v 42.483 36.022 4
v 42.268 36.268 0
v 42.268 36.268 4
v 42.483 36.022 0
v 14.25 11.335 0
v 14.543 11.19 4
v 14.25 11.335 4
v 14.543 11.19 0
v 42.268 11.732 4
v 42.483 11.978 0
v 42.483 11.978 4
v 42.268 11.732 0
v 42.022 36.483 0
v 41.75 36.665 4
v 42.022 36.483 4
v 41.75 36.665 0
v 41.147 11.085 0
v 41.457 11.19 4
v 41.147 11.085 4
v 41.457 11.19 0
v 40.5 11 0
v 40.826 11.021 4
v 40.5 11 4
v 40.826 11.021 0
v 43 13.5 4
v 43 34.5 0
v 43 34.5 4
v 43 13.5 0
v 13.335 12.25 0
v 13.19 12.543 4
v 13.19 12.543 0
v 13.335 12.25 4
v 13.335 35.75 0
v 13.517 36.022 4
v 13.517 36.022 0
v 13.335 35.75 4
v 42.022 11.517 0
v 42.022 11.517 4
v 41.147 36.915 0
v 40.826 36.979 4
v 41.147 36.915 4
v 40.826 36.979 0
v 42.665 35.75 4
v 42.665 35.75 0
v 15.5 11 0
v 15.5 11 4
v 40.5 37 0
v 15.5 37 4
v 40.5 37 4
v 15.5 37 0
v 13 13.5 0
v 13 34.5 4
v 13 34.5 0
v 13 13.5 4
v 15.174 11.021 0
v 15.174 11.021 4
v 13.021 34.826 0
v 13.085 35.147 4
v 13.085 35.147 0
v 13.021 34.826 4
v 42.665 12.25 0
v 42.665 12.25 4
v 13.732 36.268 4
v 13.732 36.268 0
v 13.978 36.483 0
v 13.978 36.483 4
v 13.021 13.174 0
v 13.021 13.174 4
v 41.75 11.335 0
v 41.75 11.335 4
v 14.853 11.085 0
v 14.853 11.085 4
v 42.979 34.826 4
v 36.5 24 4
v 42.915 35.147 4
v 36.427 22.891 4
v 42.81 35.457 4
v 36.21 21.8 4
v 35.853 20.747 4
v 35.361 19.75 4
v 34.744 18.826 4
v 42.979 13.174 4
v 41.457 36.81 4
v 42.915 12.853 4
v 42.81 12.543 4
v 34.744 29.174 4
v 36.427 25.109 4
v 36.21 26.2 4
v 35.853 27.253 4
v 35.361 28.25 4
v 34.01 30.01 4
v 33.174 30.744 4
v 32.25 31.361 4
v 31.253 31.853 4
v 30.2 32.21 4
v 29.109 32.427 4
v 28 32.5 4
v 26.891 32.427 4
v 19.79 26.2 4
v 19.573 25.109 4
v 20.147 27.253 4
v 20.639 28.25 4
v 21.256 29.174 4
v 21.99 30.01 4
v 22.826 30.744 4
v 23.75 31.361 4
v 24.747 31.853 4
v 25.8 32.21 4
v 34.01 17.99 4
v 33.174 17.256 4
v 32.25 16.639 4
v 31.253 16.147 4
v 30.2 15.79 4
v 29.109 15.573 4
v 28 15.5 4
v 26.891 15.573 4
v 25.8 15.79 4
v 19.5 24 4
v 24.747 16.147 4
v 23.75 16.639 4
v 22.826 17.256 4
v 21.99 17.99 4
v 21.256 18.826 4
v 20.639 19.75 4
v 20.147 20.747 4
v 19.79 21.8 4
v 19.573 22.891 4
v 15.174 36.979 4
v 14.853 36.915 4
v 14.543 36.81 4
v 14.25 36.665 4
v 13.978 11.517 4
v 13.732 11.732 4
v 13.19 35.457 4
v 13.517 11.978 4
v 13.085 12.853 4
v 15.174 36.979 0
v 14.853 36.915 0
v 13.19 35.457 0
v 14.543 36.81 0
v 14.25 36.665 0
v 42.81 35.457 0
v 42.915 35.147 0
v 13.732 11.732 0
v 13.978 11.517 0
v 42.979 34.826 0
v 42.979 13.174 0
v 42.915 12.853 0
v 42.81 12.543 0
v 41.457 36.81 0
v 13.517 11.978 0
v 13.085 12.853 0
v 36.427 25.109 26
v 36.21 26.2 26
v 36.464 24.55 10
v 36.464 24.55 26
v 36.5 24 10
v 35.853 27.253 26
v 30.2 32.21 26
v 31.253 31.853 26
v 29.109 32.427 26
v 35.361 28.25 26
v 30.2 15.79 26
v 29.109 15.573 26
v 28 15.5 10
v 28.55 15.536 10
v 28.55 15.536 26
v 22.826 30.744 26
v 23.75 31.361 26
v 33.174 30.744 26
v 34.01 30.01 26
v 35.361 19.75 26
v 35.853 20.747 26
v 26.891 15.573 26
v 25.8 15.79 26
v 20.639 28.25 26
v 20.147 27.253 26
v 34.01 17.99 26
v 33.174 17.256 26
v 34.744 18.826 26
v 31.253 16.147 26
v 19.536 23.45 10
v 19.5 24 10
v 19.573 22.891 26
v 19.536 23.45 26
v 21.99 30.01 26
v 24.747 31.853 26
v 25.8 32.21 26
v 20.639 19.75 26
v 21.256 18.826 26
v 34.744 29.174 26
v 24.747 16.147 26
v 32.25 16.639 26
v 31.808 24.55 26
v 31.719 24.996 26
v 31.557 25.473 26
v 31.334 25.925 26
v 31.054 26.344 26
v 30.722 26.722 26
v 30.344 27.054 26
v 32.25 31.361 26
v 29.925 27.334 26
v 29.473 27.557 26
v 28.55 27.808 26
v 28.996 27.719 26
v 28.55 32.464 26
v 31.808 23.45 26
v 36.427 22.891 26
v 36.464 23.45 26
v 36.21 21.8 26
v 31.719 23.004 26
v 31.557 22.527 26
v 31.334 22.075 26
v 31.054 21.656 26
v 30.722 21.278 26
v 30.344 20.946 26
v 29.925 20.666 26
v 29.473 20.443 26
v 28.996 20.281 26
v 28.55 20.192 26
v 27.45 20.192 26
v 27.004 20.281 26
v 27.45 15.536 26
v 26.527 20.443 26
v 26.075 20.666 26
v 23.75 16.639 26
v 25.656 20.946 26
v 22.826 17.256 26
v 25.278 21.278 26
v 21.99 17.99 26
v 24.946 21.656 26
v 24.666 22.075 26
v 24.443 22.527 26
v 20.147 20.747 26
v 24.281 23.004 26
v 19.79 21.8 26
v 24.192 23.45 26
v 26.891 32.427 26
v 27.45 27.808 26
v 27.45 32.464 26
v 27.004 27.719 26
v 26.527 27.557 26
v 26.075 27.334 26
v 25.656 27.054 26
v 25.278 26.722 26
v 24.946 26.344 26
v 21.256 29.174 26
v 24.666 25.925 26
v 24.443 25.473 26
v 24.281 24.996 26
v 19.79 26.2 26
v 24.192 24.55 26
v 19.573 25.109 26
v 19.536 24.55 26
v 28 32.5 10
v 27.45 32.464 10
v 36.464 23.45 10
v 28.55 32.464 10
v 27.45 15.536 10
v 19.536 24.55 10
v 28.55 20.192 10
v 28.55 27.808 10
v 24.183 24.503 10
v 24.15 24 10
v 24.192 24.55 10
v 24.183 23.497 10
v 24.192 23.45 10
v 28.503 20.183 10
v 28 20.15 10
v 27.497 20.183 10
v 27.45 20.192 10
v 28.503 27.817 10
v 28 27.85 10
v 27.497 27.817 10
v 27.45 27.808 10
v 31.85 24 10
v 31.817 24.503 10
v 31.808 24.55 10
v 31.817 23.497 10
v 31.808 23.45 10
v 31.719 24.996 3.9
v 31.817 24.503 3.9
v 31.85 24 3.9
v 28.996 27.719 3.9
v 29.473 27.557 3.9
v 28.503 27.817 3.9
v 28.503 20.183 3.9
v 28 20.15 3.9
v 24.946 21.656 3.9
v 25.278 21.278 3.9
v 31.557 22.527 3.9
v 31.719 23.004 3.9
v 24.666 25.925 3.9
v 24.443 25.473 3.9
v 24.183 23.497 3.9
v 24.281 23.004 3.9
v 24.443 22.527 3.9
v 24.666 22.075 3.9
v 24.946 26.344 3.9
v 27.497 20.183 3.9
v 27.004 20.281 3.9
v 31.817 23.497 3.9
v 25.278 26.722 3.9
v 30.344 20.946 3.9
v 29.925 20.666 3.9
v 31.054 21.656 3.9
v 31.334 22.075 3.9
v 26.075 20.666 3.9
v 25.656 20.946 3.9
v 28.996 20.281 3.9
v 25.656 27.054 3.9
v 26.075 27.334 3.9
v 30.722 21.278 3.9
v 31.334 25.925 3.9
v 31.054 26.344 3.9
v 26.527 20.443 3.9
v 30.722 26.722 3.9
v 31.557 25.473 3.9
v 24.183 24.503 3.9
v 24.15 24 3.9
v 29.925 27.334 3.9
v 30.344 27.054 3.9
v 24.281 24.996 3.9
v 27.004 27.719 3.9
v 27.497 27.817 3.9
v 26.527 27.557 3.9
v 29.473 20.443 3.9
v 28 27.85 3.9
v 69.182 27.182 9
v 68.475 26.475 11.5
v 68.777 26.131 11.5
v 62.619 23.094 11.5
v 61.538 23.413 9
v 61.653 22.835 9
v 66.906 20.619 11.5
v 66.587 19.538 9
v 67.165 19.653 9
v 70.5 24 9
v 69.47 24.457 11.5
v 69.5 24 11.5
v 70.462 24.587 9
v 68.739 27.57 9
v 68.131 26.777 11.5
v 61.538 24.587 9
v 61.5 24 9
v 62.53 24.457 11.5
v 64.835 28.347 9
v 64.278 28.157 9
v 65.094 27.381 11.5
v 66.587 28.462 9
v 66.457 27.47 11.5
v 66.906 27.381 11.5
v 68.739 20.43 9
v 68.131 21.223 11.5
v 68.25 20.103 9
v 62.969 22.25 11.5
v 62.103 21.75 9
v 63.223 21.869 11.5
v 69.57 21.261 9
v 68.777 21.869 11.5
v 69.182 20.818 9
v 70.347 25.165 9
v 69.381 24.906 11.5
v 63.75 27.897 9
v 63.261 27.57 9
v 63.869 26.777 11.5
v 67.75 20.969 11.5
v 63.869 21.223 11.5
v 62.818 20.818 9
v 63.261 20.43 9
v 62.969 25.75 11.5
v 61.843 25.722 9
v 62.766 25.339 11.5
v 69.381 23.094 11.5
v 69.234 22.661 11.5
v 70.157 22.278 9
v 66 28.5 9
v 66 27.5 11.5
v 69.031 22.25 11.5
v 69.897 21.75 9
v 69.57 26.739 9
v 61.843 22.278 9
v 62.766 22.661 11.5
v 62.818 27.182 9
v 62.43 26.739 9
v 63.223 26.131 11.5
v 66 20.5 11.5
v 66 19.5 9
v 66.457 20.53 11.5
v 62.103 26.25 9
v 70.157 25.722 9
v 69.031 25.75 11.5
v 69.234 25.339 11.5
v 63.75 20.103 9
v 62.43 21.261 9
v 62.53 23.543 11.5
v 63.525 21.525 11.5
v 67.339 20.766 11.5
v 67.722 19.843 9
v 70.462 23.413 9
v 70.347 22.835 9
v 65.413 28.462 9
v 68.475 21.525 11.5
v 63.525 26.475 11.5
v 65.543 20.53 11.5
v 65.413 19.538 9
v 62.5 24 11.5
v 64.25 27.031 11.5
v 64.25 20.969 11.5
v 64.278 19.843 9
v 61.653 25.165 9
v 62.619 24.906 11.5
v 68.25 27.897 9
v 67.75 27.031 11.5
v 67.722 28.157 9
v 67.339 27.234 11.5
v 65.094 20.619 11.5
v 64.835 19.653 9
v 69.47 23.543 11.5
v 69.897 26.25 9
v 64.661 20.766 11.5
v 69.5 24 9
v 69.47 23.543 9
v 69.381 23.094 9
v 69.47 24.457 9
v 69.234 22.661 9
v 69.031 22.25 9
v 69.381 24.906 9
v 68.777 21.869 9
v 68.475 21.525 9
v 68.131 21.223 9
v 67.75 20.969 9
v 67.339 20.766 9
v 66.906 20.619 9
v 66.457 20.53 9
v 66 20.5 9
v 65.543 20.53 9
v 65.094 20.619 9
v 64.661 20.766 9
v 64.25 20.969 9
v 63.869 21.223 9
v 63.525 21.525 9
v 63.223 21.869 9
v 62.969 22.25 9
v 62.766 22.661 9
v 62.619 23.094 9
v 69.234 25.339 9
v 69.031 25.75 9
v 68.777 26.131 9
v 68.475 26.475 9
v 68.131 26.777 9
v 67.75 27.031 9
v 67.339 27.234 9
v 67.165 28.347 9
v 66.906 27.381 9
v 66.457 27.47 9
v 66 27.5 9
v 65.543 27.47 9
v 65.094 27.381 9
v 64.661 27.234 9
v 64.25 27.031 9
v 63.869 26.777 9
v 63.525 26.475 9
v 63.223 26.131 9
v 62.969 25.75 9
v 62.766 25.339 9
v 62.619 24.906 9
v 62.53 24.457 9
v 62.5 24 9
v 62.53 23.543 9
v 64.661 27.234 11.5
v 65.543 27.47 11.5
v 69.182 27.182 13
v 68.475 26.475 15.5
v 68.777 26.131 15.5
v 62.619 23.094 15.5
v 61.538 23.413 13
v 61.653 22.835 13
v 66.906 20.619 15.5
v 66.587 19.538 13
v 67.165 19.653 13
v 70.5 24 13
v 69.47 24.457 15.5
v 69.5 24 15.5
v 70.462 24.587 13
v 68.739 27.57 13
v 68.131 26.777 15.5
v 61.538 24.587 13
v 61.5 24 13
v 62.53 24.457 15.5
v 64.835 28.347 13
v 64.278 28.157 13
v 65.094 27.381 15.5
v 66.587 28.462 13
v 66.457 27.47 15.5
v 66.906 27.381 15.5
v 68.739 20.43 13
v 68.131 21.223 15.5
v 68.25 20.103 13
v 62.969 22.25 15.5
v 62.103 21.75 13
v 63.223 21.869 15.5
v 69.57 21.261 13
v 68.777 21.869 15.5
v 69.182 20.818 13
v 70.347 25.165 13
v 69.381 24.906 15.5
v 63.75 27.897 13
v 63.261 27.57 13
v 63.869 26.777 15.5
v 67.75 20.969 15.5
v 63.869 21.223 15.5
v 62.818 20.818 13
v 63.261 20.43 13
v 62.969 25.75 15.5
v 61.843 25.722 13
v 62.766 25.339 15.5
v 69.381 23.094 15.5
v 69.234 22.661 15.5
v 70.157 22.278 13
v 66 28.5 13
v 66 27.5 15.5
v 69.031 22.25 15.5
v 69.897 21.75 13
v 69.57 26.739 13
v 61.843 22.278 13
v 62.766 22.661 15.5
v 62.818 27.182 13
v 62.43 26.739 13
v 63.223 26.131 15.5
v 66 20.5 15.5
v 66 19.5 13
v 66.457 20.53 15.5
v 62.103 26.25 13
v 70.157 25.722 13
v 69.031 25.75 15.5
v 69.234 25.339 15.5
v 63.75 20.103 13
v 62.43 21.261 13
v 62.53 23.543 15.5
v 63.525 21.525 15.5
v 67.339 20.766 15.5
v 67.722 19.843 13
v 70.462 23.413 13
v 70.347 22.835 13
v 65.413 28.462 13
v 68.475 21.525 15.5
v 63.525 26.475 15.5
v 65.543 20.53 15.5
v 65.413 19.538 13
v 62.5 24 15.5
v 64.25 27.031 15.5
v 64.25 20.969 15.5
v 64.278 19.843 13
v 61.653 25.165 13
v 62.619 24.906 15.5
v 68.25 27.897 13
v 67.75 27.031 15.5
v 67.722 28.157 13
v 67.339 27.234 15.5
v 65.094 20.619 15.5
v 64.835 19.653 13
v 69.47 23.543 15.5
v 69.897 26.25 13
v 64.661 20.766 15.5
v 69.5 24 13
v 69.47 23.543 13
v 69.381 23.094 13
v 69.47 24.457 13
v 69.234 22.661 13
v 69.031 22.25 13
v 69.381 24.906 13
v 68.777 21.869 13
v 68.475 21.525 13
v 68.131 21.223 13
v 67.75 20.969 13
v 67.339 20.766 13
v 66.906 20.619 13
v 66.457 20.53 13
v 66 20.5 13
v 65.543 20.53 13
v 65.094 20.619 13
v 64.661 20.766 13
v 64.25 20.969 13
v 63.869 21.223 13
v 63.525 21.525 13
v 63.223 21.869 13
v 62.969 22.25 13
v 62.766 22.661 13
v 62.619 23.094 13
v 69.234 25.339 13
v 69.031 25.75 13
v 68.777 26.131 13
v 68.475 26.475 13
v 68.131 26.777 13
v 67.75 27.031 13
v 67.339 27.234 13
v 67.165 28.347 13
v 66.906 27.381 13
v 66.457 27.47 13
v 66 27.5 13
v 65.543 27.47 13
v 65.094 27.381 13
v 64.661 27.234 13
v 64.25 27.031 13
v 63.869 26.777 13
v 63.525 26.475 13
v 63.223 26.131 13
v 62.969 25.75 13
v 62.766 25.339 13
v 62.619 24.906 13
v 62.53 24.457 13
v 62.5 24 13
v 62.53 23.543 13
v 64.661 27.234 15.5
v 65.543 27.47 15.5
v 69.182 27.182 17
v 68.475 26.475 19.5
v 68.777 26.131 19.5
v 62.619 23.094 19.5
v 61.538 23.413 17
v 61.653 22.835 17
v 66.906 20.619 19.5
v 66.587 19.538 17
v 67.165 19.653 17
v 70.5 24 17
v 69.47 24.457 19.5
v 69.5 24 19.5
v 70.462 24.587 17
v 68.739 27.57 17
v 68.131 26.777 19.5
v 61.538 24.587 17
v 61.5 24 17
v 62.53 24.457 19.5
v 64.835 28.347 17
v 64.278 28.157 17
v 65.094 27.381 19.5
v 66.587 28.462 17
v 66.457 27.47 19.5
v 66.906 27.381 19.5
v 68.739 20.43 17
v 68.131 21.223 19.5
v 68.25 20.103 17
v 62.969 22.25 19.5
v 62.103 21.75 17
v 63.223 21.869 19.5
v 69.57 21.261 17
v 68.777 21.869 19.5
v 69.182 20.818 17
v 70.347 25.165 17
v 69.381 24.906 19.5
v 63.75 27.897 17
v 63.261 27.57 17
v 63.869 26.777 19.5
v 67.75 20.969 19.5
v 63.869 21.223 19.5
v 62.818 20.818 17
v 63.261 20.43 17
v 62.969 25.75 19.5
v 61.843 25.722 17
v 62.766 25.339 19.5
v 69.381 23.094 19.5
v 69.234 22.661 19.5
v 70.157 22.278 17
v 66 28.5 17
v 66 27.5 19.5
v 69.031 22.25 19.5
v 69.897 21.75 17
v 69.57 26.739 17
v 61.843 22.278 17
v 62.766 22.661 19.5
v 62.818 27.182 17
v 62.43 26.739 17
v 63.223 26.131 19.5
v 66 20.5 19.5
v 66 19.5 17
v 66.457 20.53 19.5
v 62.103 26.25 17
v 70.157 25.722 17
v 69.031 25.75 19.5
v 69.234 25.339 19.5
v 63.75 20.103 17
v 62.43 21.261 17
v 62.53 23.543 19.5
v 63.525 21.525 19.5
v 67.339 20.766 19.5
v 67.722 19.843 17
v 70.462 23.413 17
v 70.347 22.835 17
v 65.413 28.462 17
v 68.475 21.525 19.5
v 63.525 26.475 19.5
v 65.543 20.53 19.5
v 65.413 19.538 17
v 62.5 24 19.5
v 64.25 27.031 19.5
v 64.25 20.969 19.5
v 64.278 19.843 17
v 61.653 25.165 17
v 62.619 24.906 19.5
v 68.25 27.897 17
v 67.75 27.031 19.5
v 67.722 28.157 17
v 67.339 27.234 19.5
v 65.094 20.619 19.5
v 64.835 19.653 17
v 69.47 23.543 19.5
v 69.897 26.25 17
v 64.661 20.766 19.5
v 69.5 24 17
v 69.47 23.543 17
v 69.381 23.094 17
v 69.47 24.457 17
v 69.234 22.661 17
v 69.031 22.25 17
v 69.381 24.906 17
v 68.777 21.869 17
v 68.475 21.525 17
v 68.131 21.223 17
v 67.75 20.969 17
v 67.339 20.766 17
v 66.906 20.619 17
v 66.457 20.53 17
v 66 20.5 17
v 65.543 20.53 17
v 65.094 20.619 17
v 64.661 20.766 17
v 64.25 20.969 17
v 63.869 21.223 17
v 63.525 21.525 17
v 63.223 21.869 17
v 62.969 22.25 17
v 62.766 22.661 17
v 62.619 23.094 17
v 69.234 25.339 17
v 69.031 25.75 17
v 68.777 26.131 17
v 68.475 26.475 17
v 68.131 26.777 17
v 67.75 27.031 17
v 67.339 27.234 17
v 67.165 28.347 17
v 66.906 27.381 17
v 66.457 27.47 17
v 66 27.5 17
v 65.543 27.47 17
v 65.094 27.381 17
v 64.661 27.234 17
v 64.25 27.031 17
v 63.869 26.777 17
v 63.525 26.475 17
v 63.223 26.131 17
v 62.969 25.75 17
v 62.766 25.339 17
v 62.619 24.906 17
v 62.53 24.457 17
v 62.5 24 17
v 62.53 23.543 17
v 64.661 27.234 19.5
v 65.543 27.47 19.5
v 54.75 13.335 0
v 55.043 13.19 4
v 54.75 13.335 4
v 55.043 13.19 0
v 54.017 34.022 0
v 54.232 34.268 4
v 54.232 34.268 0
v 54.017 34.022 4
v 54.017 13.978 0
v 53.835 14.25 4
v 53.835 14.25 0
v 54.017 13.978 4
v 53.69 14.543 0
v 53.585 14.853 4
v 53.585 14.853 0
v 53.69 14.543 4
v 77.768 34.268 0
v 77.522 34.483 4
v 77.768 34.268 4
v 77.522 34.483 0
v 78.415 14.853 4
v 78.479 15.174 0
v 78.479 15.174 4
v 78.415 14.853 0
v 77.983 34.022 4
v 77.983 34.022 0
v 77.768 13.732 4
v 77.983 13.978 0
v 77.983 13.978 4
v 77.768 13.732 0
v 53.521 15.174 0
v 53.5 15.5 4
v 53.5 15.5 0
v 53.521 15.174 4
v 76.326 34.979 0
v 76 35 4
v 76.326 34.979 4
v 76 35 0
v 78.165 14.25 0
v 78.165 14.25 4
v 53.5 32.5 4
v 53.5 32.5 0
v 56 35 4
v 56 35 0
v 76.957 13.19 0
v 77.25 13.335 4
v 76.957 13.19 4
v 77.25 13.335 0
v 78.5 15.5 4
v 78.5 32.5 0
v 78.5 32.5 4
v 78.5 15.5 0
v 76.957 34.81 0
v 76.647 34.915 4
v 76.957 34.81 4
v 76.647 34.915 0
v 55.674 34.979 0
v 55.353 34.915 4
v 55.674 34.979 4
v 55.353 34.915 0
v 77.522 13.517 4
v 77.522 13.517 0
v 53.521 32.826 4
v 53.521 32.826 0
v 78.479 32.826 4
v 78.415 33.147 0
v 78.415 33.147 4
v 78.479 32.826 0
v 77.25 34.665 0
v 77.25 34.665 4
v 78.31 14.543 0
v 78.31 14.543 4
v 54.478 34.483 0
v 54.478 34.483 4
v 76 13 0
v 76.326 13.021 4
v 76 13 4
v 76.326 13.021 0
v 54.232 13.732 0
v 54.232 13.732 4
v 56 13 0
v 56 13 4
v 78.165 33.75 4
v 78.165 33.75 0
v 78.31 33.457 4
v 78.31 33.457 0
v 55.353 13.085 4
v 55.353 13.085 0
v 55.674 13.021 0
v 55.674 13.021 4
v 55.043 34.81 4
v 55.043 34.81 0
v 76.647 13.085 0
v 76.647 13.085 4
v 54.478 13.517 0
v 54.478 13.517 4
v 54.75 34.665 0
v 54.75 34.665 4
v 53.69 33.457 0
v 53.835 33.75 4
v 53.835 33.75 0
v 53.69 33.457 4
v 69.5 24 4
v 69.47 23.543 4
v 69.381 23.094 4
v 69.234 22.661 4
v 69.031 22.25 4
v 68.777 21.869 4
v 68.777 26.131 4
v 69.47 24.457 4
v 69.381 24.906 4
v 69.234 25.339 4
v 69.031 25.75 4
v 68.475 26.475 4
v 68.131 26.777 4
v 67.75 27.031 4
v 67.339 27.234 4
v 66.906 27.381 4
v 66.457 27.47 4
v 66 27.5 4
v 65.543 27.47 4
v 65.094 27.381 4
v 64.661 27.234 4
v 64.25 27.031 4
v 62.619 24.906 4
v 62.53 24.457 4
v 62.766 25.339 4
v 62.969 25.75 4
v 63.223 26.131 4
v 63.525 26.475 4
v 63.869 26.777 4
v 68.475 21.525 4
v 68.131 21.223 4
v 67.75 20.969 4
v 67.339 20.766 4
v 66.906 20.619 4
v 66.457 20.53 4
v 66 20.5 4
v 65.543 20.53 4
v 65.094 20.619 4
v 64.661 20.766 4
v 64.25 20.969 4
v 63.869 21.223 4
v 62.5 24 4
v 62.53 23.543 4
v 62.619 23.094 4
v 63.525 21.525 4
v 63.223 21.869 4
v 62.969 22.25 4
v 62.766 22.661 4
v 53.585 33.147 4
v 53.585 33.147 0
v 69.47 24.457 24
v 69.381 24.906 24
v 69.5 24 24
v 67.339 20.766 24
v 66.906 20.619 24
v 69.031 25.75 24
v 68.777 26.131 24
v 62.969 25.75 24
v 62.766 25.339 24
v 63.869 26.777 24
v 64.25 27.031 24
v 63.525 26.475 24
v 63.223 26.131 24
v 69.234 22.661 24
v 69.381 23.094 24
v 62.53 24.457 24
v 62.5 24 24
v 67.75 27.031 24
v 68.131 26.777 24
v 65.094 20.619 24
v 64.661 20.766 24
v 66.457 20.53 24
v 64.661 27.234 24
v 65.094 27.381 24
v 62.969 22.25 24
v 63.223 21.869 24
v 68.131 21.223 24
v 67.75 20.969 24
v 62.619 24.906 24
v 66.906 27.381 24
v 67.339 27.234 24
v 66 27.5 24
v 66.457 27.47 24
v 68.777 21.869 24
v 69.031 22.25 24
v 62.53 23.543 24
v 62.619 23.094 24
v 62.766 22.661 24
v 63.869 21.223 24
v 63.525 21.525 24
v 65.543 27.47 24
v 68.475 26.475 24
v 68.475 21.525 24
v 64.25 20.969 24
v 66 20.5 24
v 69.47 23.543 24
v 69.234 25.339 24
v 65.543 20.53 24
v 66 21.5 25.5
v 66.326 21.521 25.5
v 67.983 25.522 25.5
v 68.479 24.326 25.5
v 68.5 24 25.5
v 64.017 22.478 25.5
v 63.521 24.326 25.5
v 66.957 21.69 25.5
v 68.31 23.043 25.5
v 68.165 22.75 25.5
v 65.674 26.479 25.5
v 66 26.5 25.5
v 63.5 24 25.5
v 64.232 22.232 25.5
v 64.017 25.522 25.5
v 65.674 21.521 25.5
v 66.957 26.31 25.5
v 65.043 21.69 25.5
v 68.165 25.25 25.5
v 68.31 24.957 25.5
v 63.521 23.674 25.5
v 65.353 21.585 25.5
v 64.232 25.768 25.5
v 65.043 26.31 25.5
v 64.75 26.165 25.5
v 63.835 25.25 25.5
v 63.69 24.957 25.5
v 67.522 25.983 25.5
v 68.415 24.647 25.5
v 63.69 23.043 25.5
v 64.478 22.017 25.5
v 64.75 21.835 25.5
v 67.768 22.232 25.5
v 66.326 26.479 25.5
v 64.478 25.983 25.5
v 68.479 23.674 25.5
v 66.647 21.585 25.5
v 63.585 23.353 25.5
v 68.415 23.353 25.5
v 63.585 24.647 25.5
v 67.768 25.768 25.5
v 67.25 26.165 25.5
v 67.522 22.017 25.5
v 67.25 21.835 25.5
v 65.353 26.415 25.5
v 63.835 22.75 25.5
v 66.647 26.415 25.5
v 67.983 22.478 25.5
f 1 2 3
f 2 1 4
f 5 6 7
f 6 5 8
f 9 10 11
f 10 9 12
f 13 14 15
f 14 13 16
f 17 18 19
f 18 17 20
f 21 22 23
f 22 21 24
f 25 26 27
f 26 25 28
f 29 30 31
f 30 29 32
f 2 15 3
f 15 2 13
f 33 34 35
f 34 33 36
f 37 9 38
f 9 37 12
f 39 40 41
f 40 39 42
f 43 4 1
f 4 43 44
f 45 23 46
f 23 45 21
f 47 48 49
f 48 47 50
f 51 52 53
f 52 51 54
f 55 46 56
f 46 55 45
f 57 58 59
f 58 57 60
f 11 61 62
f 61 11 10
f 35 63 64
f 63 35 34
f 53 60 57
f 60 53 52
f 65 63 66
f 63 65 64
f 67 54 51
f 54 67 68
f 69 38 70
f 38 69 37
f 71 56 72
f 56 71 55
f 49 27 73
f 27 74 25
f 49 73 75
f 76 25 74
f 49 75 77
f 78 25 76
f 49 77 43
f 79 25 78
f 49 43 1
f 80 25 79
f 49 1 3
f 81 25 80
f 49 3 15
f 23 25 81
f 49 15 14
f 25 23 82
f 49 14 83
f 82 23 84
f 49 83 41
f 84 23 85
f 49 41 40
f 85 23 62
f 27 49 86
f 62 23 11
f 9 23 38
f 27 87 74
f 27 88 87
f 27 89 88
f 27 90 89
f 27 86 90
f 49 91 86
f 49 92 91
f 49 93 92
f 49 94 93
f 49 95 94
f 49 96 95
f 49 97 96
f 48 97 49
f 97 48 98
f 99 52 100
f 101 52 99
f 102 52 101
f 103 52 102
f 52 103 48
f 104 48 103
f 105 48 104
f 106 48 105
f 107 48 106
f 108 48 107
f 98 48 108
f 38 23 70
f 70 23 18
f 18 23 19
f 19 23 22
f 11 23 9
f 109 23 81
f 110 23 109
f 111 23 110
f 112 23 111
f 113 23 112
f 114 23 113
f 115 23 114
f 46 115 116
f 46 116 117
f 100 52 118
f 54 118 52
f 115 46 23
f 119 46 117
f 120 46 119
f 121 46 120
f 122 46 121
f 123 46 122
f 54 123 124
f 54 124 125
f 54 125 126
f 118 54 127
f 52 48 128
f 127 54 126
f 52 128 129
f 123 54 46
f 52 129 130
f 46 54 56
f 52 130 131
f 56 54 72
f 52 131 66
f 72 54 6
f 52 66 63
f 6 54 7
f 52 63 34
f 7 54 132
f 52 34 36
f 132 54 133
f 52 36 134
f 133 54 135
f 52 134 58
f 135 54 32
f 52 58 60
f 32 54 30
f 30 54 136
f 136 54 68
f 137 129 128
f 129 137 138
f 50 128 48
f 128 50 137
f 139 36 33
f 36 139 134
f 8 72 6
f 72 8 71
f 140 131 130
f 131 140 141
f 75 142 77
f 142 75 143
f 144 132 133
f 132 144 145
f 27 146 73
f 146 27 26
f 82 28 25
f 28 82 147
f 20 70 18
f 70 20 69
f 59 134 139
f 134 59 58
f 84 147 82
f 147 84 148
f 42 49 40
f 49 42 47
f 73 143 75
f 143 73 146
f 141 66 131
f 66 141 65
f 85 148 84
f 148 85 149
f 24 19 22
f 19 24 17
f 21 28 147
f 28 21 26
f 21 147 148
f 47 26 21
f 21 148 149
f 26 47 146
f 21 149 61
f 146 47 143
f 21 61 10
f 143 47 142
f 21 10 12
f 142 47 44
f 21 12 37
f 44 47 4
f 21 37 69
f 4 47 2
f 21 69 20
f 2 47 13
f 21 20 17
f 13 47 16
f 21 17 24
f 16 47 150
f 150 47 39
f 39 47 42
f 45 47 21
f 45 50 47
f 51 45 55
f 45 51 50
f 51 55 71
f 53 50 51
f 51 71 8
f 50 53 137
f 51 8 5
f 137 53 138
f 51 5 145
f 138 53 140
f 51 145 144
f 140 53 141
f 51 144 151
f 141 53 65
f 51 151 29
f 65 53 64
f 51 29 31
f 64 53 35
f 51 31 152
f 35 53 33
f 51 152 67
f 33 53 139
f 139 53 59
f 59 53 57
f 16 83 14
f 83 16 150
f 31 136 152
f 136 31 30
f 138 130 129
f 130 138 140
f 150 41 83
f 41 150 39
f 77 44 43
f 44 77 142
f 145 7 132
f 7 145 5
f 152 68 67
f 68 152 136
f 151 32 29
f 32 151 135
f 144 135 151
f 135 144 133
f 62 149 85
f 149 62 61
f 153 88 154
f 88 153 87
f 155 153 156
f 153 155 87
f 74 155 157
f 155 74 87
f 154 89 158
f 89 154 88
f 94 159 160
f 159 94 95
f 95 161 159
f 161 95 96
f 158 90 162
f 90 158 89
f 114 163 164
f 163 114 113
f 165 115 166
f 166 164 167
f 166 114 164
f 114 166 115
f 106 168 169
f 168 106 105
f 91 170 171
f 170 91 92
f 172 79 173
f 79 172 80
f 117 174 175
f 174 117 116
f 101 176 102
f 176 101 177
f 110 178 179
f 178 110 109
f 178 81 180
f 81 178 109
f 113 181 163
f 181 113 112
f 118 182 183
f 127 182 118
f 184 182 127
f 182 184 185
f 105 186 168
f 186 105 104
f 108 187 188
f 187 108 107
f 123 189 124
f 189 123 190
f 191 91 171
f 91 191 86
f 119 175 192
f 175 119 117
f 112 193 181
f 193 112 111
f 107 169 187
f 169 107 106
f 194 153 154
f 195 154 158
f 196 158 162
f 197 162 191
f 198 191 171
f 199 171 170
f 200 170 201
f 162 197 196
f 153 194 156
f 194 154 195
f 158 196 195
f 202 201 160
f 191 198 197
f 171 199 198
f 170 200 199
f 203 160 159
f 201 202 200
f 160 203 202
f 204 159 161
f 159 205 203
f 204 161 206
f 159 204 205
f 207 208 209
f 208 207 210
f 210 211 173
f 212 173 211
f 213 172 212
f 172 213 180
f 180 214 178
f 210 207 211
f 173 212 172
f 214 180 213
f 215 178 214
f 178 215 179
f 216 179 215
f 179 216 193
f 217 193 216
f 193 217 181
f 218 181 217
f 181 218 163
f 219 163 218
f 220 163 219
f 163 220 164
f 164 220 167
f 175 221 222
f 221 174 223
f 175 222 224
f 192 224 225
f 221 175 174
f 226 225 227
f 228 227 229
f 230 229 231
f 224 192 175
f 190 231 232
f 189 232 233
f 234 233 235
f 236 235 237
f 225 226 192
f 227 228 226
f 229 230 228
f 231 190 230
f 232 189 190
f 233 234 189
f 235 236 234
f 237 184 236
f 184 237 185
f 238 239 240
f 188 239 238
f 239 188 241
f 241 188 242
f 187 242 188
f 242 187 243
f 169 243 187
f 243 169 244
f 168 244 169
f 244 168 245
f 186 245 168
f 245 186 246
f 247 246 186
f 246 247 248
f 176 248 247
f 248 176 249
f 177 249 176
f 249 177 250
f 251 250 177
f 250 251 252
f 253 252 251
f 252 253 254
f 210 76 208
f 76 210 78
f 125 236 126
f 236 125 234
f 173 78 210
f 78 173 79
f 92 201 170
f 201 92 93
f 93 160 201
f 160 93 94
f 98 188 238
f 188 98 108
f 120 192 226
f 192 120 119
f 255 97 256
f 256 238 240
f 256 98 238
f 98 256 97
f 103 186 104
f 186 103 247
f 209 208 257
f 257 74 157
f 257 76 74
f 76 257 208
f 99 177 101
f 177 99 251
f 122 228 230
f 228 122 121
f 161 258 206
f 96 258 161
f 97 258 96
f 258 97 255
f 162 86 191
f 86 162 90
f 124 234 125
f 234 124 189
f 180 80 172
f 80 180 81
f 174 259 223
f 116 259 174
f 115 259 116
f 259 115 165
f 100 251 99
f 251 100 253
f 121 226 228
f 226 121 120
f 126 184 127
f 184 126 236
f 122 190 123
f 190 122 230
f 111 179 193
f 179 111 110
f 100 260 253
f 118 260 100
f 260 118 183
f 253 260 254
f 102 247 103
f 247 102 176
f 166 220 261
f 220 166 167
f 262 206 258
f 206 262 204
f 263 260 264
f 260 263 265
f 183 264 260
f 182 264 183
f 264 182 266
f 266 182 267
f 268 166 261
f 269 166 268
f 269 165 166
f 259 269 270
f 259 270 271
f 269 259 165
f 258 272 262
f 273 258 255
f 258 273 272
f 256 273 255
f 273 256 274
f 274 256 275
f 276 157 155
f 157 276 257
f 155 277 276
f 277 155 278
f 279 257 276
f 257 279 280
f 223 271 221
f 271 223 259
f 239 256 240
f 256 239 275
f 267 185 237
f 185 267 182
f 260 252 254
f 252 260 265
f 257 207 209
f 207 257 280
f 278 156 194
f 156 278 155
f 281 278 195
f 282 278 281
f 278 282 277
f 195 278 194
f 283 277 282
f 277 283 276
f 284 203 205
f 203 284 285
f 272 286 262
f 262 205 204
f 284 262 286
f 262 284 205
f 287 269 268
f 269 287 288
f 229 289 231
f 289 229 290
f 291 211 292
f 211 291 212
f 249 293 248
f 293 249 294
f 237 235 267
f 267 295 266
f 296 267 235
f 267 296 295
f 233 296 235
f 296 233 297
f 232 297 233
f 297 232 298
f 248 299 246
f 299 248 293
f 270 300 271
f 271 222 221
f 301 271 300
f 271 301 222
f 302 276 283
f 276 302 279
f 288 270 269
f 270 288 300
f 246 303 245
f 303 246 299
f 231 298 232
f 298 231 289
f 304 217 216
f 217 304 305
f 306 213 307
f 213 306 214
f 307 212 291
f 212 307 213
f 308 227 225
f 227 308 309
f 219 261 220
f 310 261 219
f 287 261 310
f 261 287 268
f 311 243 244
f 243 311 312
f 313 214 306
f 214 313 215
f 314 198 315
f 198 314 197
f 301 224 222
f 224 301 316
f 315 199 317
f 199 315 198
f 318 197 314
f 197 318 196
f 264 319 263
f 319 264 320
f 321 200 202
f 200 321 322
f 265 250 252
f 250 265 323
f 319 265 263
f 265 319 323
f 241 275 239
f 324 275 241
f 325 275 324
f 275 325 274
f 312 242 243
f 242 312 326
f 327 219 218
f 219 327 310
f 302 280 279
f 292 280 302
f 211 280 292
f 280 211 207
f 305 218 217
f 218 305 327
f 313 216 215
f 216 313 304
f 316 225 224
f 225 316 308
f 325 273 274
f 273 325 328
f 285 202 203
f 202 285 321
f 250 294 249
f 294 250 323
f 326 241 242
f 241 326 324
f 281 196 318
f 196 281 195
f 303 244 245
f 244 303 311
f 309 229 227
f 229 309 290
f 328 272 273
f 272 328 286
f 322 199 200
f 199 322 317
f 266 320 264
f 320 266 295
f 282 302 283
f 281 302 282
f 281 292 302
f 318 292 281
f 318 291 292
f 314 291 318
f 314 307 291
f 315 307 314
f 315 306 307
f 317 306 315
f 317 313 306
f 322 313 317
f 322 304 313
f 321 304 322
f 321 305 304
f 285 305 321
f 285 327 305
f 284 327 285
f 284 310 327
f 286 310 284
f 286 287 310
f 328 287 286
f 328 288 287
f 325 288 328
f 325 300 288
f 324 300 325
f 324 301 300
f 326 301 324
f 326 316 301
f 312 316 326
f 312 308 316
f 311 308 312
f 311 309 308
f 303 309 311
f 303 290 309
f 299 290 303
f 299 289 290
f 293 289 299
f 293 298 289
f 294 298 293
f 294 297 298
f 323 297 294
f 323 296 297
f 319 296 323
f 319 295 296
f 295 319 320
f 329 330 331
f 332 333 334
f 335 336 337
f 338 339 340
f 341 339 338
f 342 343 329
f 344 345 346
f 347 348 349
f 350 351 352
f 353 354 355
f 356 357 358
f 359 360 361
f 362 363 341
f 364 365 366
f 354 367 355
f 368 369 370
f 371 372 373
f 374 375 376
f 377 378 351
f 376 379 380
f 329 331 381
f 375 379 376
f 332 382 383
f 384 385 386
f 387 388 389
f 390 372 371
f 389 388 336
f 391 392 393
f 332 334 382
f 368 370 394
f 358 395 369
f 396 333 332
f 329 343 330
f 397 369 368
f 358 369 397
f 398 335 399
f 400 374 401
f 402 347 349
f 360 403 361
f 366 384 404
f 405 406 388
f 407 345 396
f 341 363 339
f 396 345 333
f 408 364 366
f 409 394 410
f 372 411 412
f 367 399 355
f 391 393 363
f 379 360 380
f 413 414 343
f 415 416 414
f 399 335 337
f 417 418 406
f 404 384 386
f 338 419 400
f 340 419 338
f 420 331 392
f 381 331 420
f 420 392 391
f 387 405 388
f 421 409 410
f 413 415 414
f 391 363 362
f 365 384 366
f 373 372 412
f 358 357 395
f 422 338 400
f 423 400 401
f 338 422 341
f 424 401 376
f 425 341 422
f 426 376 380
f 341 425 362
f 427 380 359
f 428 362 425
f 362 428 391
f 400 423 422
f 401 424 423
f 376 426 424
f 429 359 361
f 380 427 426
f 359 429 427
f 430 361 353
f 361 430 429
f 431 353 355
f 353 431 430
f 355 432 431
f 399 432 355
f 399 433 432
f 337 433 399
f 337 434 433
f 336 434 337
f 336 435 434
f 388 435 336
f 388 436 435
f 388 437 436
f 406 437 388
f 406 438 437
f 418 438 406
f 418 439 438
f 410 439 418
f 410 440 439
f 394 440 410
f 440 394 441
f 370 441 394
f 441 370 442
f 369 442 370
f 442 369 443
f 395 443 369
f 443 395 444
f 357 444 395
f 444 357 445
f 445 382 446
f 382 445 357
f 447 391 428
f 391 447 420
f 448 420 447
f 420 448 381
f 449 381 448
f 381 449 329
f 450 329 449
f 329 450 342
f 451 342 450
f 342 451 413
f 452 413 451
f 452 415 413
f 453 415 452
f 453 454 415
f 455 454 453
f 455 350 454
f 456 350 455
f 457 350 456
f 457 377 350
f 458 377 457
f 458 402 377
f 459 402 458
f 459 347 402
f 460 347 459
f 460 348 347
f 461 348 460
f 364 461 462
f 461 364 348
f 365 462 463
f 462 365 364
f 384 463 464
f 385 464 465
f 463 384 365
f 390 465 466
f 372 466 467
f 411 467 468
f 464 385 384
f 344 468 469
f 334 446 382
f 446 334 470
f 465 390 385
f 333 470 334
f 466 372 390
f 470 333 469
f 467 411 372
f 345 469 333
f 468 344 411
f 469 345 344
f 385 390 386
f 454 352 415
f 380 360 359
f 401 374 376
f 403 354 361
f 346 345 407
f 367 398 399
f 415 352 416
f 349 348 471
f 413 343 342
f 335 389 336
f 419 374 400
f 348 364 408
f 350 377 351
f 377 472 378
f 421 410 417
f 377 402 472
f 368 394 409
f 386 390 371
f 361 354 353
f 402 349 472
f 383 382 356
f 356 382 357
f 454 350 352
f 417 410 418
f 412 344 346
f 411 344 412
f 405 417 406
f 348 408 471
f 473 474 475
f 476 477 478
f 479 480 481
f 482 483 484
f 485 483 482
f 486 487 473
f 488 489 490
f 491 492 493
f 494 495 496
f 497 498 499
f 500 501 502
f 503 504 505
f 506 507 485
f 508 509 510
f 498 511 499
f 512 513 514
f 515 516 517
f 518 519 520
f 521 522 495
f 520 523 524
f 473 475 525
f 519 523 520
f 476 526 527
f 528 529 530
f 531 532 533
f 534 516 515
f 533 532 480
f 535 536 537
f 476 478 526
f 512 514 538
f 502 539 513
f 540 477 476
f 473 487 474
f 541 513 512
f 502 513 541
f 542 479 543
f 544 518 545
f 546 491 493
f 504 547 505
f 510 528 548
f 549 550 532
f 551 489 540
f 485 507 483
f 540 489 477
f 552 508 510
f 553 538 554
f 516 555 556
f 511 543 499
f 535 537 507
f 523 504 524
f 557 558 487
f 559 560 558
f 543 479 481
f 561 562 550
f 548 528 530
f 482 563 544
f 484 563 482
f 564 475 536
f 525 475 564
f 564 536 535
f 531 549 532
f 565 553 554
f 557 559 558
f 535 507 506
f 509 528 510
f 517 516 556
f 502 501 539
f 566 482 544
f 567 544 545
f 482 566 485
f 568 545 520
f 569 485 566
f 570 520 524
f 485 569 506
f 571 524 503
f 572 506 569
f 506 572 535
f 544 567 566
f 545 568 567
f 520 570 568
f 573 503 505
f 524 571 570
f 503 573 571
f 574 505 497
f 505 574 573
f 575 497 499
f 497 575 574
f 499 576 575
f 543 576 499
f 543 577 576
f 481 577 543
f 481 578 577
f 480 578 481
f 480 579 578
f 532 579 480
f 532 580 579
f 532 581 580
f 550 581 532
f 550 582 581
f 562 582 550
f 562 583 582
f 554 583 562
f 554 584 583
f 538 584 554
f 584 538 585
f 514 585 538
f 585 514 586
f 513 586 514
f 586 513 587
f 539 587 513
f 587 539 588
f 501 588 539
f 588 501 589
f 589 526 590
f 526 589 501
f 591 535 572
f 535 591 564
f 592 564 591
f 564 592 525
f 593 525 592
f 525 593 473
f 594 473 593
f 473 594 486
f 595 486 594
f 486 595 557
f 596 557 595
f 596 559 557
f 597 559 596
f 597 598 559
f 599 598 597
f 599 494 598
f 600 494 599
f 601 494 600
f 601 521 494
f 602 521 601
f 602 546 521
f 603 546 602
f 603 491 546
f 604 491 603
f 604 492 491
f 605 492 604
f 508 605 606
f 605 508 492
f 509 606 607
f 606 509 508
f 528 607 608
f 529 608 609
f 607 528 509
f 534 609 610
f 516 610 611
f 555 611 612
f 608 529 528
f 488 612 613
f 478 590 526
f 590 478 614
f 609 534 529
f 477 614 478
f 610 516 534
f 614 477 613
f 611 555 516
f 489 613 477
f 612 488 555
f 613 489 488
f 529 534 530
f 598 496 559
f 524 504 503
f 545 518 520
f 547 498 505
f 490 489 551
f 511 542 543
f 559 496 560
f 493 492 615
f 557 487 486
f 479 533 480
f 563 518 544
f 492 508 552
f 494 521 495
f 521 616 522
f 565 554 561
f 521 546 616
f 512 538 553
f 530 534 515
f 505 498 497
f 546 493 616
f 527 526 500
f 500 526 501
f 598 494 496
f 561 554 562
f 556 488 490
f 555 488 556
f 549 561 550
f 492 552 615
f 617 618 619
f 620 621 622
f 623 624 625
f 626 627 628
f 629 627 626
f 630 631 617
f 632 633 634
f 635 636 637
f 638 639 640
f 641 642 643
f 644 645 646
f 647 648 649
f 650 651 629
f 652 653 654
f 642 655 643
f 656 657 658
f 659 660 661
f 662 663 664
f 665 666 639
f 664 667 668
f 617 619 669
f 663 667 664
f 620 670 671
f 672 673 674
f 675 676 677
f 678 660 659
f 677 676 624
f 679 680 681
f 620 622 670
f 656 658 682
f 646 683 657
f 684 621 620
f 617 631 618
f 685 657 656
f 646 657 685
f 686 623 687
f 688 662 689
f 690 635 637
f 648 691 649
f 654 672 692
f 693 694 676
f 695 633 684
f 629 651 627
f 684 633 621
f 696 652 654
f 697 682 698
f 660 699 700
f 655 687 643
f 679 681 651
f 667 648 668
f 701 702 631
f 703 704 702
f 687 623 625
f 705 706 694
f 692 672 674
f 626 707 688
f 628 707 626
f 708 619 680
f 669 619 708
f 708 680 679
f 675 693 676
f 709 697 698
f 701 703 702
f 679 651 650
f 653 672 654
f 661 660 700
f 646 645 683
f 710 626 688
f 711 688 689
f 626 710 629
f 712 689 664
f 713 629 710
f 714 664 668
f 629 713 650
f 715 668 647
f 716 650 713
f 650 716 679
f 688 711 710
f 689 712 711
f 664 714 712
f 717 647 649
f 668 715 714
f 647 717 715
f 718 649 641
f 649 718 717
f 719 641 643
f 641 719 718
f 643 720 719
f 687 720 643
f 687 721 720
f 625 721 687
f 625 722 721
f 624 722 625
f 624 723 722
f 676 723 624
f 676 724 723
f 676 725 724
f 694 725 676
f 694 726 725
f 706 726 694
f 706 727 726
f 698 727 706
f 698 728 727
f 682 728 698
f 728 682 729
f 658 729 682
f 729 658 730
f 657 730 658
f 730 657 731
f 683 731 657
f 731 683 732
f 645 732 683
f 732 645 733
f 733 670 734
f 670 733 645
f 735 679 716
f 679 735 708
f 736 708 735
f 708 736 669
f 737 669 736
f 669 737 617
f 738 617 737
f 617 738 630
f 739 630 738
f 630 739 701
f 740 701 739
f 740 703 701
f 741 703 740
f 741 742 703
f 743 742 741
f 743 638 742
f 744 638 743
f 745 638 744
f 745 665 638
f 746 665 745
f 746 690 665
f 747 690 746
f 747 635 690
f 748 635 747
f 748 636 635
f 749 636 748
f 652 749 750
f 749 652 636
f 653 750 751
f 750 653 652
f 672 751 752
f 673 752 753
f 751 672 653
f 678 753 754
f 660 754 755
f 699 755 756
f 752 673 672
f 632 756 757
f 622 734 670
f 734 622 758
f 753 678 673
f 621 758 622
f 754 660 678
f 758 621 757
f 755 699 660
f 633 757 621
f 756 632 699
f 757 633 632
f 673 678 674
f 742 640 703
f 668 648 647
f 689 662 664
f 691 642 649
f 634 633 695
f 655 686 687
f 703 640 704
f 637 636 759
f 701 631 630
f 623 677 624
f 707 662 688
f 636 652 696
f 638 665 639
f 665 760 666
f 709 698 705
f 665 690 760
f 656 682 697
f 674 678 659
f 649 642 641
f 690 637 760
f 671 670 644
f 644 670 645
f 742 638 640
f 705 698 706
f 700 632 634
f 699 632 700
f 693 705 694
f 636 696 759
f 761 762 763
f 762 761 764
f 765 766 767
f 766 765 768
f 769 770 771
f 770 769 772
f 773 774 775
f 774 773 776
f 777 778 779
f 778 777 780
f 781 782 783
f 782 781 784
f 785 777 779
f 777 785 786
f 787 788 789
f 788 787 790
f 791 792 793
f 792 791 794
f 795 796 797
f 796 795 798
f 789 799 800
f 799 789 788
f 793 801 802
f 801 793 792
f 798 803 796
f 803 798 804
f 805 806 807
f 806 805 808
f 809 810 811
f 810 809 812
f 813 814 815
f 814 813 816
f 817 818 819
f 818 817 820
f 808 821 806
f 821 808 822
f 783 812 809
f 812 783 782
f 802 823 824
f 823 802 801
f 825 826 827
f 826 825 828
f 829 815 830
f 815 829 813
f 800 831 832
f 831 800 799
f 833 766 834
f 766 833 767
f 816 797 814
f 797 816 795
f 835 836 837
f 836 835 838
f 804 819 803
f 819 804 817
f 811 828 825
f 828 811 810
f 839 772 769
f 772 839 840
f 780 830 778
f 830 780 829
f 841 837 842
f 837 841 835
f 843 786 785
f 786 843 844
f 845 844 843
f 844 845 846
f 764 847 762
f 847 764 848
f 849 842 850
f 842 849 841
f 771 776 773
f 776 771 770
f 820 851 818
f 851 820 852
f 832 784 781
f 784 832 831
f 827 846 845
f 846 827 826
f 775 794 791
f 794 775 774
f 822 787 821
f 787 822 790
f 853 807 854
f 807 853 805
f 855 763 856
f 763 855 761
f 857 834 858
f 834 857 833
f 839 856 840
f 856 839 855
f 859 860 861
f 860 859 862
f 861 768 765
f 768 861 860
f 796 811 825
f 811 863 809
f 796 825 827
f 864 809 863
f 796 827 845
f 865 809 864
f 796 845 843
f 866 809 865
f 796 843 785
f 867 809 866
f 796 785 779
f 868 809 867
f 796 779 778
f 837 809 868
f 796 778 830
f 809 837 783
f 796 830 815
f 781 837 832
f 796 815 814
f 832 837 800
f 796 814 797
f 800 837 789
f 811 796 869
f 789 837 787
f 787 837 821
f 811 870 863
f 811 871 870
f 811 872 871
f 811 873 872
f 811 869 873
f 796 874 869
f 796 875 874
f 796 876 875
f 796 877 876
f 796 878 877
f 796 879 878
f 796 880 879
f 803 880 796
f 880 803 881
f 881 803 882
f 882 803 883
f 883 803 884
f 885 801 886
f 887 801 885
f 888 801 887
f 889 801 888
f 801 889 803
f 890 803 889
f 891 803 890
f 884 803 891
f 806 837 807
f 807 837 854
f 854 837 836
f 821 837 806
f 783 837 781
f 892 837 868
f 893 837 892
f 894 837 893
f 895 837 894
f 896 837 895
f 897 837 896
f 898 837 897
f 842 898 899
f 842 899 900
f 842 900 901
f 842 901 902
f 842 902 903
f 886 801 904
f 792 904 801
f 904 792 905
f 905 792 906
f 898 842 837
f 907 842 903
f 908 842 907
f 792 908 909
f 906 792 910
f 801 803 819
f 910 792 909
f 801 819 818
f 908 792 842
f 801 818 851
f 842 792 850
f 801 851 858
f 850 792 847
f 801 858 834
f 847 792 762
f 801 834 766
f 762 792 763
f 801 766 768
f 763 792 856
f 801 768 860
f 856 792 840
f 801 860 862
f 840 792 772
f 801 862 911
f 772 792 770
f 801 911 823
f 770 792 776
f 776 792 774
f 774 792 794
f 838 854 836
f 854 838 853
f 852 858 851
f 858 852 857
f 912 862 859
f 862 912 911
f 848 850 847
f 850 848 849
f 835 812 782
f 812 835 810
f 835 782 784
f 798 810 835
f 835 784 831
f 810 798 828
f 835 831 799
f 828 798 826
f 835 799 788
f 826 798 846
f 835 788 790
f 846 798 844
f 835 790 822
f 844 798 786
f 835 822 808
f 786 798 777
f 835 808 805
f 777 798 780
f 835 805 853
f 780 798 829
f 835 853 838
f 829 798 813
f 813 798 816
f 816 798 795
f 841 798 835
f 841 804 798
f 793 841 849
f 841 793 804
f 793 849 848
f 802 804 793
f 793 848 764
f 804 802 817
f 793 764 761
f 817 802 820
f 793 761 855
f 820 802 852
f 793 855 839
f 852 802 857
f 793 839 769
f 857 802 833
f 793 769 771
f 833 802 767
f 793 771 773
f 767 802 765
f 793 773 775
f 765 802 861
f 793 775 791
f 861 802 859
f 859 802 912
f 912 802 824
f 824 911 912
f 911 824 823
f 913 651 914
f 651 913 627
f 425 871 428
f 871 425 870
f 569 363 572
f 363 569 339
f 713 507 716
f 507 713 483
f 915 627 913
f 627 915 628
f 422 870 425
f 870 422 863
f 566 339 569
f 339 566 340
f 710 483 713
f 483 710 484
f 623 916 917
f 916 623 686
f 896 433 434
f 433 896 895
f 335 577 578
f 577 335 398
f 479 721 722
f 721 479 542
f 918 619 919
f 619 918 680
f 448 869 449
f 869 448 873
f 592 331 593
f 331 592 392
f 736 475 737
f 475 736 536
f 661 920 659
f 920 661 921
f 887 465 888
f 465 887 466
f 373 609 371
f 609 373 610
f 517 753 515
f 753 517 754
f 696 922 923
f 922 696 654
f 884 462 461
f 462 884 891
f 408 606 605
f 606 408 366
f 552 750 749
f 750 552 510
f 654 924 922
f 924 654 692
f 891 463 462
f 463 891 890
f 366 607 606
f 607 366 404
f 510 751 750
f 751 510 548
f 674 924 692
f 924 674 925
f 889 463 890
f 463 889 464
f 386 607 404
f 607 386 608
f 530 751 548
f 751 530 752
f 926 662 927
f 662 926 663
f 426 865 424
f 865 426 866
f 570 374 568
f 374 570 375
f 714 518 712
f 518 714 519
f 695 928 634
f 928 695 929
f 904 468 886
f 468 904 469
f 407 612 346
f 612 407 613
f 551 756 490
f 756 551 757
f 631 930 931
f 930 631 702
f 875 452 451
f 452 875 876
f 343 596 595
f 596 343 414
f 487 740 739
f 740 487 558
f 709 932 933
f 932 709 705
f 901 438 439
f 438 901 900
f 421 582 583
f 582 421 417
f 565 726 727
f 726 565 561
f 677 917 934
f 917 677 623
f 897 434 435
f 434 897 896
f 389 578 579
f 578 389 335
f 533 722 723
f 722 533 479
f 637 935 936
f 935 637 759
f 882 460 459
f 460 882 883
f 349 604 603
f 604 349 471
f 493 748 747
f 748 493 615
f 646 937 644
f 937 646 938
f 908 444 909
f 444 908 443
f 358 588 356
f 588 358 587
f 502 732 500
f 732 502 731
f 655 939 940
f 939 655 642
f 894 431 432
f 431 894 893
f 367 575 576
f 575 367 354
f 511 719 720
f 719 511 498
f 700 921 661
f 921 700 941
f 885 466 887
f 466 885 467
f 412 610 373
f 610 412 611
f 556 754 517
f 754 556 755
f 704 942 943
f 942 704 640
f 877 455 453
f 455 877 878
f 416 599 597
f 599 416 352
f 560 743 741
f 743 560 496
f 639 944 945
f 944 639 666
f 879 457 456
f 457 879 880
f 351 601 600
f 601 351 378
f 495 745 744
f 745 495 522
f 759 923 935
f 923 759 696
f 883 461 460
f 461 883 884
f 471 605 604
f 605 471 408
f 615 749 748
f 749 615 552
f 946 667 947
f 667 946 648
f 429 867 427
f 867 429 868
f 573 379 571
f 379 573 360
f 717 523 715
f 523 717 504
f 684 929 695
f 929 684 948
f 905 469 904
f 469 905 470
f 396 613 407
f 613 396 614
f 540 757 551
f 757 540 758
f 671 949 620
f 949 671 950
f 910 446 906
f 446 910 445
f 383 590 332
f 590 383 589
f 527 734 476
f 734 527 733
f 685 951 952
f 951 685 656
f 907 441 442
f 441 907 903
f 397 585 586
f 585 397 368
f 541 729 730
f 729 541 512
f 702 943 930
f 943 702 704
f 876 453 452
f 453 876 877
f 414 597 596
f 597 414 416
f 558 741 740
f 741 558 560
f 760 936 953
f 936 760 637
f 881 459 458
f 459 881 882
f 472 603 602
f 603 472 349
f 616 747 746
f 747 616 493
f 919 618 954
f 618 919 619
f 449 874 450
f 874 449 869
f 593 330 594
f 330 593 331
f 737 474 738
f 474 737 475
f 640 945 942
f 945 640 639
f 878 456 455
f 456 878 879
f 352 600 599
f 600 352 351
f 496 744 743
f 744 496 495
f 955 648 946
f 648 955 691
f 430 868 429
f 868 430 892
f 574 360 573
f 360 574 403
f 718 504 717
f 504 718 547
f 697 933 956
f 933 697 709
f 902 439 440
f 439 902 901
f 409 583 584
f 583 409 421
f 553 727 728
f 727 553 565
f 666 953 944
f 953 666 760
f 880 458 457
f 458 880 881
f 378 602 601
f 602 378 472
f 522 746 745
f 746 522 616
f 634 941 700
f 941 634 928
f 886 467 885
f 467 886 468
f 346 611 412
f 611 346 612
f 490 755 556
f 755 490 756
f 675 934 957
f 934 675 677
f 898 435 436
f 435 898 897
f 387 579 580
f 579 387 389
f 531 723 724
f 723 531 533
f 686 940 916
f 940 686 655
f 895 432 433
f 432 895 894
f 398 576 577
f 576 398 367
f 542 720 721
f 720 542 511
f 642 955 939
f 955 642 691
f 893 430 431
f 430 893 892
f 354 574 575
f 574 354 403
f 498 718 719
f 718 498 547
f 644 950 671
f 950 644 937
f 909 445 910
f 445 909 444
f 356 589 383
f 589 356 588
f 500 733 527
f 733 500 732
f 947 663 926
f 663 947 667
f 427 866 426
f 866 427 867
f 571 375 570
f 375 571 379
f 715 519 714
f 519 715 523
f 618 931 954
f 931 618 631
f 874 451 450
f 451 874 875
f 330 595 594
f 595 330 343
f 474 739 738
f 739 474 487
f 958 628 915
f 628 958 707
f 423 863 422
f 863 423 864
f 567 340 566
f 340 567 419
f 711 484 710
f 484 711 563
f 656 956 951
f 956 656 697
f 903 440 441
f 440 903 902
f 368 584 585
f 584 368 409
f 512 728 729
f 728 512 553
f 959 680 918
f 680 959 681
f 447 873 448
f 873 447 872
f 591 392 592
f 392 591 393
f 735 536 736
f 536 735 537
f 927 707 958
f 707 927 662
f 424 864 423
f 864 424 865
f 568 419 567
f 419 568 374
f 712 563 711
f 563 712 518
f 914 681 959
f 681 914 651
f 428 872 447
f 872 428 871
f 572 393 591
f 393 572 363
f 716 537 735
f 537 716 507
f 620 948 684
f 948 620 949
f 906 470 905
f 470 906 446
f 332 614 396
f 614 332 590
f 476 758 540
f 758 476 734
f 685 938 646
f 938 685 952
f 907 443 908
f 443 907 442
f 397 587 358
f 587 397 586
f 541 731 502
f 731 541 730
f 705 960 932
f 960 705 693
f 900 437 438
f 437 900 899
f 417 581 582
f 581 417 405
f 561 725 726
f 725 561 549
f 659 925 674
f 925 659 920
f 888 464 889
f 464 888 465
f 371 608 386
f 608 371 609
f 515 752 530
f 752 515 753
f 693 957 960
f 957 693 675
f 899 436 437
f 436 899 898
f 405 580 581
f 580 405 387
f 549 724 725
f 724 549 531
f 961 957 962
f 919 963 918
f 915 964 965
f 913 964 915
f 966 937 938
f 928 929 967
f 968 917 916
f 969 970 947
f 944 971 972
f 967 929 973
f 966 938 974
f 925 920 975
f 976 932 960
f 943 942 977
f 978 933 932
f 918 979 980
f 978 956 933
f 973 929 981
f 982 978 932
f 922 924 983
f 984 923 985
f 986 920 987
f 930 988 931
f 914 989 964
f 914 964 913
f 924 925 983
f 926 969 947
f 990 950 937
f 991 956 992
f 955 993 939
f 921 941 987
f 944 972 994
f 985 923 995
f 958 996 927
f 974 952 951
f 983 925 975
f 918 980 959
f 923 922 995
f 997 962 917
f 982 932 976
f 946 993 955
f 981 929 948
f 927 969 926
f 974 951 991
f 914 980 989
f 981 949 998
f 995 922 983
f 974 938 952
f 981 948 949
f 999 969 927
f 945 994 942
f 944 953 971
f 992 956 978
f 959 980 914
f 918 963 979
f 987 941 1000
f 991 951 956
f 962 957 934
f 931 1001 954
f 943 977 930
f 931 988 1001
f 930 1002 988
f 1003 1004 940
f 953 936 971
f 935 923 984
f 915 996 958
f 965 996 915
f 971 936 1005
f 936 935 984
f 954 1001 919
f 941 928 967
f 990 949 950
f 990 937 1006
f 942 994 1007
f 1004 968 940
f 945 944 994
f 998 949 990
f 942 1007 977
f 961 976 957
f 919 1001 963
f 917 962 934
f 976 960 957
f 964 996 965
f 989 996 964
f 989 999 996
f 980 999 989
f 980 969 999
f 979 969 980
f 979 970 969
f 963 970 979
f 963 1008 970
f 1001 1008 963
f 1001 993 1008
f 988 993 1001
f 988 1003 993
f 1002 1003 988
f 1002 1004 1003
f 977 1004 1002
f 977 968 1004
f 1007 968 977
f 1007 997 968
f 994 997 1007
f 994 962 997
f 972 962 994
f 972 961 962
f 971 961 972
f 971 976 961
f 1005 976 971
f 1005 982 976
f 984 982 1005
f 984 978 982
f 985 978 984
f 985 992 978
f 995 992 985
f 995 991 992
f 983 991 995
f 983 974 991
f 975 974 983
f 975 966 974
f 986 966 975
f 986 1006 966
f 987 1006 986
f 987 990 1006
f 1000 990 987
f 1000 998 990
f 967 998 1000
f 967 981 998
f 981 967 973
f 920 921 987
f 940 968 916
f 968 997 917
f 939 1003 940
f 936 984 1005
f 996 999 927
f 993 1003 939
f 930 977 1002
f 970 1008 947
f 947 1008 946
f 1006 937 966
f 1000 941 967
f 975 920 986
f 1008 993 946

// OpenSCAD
/*
Sample 047: Einweg-Steckverbinder mit Widerhaken — 0,35 mm
Generated from the FDM Mechanical Sample Library.
Units: millimetres.

Override examples:
  openscad -o custom.stl -D 'view="plate"' -D 'render_fn=64' model.scad
  openscad -o preview.png -D 'view="assembly"' model.scad
*/
use <../../../library/fdm_mechanisms.scad>

render_fn = is_undef(render_fn) ? 48 : render_fn;
view = is_undef(view) ? "plate" : view;
$fn = render_fn;

sample_barbed_connector(
    view=view,
    clearance=0.35,
    pin_d=7,
    barb_h=1
);
